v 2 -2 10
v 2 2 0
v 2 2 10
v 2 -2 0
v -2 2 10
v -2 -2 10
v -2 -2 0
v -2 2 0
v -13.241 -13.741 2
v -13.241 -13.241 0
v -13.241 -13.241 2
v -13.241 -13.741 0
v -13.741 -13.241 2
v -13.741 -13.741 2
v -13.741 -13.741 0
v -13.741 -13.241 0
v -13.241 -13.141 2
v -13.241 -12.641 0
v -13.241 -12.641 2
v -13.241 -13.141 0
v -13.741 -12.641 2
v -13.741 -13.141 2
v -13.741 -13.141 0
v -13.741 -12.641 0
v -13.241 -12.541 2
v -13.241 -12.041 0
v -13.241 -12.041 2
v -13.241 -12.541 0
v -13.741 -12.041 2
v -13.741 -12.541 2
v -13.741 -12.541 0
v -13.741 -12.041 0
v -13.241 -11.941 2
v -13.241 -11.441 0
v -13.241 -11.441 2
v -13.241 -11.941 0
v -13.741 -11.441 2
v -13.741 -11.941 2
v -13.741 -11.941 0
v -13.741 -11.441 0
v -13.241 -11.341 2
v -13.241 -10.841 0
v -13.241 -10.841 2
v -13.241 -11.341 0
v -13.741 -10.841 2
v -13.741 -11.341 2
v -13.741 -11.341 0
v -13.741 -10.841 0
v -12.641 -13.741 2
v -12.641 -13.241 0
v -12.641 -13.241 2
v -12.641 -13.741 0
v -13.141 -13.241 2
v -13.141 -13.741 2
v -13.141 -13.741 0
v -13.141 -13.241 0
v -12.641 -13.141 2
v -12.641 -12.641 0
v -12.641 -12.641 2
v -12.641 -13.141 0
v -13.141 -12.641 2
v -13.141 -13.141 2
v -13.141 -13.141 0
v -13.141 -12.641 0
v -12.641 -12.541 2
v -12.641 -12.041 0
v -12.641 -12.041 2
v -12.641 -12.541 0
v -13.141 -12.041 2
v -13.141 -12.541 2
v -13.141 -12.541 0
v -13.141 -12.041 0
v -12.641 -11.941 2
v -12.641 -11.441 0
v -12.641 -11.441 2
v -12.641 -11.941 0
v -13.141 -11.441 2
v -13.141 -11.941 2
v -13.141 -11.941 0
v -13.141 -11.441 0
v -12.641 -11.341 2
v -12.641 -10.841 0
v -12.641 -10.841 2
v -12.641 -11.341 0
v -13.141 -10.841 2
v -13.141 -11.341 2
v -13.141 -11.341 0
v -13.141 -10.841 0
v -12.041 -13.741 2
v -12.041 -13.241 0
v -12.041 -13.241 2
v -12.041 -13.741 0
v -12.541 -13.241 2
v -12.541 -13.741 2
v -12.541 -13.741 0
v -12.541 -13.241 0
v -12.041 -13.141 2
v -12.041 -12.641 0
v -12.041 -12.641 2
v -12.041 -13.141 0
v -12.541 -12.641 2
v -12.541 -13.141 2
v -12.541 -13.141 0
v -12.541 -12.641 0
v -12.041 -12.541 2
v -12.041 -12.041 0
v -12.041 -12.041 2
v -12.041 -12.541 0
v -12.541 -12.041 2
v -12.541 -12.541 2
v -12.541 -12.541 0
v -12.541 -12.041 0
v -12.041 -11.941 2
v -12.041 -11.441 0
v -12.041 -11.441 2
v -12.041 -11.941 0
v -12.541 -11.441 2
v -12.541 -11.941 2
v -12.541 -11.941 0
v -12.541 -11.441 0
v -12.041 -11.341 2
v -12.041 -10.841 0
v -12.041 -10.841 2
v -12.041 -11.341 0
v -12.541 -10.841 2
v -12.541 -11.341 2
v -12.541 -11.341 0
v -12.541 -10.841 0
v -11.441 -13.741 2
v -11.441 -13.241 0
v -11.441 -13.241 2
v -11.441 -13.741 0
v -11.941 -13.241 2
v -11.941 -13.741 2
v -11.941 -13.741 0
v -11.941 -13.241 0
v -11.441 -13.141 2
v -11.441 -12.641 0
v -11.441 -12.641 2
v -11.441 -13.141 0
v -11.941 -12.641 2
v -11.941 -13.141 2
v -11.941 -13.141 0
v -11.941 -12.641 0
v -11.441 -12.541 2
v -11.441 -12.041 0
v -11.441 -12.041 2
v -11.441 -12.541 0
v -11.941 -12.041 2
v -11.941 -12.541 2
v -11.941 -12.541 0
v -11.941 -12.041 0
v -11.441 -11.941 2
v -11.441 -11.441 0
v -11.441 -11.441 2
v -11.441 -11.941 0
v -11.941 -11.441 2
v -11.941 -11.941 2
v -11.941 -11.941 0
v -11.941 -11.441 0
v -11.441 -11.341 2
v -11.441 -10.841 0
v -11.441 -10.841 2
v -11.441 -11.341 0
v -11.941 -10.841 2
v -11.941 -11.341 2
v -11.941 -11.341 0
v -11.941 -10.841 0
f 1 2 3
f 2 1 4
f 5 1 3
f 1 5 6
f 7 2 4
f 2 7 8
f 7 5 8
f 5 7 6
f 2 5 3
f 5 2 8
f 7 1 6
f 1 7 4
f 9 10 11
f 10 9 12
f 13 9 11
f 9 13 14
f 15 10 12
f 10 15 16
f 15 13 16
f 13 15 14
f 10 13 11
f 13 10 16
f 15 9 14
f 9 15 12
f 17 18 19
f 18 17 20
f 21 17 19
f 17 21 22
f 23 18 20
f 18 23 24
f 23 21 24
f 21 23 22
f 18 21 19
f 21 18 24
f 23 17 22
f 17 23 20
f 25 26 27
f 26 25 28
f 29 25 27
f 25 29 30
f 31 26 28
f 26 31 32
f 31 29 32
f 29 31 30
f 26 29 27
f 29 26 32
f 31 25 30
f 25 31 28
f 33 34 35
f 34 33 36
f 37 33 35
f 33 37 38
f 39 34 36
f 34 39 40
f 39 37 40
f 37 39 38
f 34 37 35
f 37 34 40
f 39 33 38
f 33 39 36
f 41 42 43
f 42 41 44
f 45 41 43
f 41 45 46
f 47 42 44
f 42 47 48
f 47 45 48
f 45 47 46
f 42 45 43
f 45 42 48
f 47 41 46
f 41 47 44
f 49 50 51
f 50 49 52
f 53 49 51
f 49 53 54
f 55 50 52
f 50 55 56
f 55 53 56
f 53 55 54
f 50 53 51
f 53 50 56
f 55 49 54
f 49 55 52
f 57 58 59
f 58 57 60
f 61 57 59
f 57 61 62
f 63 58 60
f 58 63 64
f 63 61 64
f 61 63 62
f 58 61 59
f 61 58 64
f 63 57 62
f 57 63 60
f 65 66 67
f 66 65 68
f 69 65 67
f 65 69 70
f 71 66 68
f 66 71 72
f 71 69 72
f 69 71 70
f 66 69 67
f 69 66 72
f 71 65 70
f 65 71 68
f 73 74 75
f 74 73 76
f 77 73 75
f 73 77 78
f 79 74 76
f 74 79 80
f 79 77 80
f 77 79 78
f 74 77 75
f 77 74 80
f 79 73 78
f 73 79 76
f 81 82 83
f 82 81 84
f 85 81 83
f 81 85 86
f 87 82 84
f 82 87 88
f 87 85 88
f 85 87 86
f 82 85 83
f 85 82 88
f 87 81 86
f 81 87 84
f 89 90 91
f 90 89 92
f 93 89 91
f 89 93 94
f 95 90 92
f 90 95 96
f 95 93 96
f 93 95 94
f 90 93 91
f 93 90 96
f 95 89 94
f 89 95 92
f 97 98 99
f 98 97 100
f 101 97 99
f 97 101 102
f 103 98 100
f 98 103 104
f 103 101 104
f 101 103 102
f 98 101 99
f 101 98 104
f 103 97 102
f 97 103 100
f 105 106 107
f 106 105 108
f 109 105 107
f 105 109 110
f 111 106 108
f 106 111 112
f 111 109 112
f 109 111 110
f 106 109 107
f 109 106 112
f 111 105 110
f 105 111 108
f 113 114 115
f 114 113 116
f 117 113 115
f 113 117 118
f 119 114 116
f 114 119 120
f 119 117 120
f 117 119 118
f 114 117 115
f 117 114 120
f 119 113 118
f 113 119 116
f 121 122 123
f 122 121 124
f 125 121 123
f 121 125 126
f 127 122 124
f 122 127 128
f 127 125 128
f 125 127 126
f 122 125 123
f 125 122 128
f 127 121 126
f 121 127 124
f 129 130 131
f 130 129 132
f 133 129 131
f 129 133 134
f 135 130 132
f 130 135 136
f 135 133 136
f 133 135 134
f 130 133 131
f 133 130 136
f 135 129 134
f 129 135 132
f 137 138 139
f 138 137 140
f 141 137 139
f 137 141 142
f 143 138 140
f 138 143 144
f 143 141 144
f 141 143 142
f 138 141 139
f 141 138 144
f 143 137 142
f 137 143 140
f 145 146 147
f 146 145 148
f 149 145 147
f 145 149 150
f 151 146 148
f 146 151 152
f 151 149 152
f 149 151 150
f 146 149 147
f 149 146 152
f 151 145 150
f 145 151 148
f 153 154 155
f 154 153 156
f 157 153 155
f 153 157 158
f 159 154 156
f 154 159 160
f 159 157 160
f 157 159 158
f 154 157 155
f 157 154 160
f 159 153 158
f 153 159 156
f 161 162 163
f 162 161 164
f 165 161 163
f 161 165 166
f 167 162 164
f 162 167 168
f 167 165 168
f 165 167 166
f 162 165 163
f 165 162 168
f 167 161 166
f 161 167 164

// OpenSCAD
translate([0, 0, 5]) color([0,1,0,0.9]) cube([4, 4, 10], center=true);
translate([-13.49071198499986, -13.49071198499986, 1]) color([1,0,0]) cube([0.5, 0.5, 2], center=true);
translate([-13.49071198499986, -12.890711984999859, 1]) color([1,0,0]) cube([0.5, 0.5, 2], center=true);
translate([-13.49071198499986, -12.29071198499986, 1]) color([1,0,0]) cube([0.5, 0.5, 2], center=true);
translate([-13.49071198499986, -11.69071198499986, 1]) color([1,0,0]) cube([0.5, 0.5, 2], center=true);
translate([-13.49071198499986, -11.09071198499986, 1]) color([1,0,0]) cube([0.5, 0.5, 2], center=true);
translate([-12.890711984999859, -13.49071198499986, 1]) color([1,0,0]) cube([0.5, 0.5, 2], center=true);
translate([-12.890711984999859, -12.890711984999859, 1]) color([1,0,0]) cube([0.5, 0.5, 2], center=true);
translate([-12.890711984999859, -12.29071198499986, 1]) color([1,0,0]) cube([0.5, 0.5, 2], center=true);
translate([-12.890711984999859, -11.69071198499986, 1]) color([1,0,0]) cube([0.5, 0.5, 2], center=true);
translate([-12.890711984999859, -11.09071198499986, 1]) color([1,0,0]) cube([0.5, 0.5, 2], center=true);
translate([-12.29071198499986, -13.49071198499986, 1]) color([1,0,0]) cube([0.5, 0.5, 2], center=true);
translate([-12.29071198499986, -12.890711984999859, 1]) color([1,0,0]) cube([0.5, 0.5, 2], center=true);
translate([-12.29071198499986, -12.29071198499986, 1]) color([1,0,0]) cube([0.5, 0.5, 2], center=true);
translate([-12.29071198499986, -11.69071198499986, 1]) color([1,0,0]) cube([0.5, 0.5, 2], center=true);
translate([-12.29071198499986, -11.09071198499986, 1]) color([1,0,0]) cube([0.5, 0.5, 2], center=true);
translate([-11.69071198499986, -13.49071198499986, 1]) color([1,0,0]) cube([0.5, 0.5, 2], center=true);
translate([-11.69071198499986, -12.890711984999859, 1]) color([1,0,0]) cube([0.5, 0.5, 2], center=true);
translate([-11.69071198499986, -12.29071198499986, 1]) color([1,0,0]) cube([0.5, 0.5, 2], center=true);
translate([-11.69071198499986, -11.69071198499986, 1]) color([1,0,0]) cube([0.5, 0.5, 2], center=true);
translate([-11.69071198499986, -11.09071198499986, 1]) color([1,0,0]) cube([0.5, 0.5, 2], center=true);
